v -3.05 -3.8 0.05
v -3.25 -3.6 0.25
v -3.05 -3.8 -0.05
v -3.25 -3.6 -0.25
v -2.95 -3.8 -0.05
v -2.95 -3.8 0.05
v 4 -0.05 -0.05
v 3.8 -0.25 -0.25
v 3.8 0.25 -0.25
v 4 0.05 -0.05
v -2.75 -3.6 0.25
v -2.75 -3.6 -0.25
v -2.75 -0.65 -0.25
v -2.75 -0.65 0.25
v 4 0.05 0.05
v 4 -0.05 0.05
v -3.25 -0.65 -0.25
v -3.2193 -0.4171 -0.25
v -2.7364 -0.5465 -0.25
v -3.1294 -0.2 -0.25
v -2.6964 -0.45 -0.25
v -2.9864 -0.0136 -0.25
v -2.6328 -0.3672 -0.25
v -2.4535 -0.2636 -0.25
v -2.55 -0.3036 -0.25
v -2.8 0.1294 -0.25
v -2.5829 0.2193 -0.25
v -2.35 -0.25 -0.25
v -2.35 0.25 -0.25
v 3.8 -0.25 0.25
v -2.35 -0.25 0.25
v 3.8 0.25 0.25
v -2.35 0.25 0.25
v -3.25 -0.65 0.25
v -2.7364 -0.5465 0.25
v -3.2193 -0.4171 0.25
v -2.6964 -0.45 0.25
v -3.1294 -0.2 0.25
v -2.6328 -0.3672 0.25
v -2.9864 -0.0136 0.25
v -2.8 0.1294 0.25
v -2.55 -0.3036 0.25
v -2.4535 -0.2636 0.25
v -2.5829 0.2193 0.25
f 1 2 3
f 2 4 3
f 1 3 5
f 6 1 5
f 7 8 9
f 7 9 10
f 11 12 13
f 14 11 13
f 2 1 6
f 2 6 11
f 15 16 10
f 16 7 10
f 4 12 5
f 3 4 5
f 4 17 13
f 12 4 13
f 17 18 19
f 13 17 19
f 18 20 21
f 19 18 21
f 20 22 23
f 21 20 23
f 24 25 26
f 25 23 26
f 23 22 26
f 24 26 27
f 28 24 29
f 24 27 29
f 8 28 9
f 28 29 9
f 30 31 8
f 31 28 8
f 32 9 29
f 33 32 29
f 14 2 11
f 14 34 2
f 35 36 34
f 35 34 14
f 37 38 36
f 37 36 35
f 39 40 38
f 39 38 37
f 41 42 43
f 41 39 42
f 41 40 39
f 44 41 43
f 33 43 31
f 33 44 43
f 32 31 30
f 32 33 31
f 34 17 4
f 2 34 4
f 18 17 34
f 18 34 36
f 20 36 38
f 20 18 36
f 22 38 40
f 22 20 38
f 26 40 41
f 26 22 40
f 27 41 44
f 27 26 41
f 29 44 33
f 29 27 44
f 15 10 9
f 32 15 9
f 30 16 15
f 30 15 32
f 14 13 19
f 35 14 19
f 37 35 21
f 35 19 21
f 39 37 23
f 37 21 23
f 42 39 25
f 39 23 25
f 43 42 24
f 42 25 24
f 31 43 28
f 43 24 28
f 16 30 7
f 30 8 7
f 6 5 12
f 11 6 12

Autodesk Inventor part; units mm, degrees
sketch "Sketch_2" plane through (0, 0, 0) normal (0, 0, 1) x (1, 0, 0)
  line L0 (-0.5, -0.25) -> (3.8, -0.25)
  line L1 (3.8, -0.25) -> (4, -0.05)
  line L2 (4, -0.05) -> (4, 0.05)
  line L3 (4, 0.05) -> (3.8, 0.25)
  line L4 (3.8, 0.25) -> (-0.5, 0.25)
  line L5 (-0.5, 0.25) -> (-0.5, -0.25)
extrude "Extrusion1" add sketch "Sketch_2" along normal mid plane 0.5
sketch "Sketch_3" plane through (0, 0, 0) normal (0, 0, 1) x (1, 0, 0)
  line L0 (-3.25, -3.6) -> (-3.05, -3.8)
  line L1 (-3.05, -3.8) -> (-2.95, -3.8)
  line L2 (-2.95, -3.8) -> (-2.75, -3.6)
  line L3 (-2.75, -3.6) -> (-2.75, -0.65)
  arc A0 (-2.35, -0.25) -> (-2.75, -0.65) centre (-2.35, -0.65) ccw
  line L4 (-2.35, -0.25) -> (-0.5, -0.25)
  line L5 (-0.5, -0.25) -> (-0.5, 0.25)
  line L6 (-0.5, 0.25) -> (-2.35, 0.25)
  arc A1 (-2.35, 0.25) -> (-3.25, -0.65) centre (-2.35, -0.65) ccw
  line L7 (-3.25, -0.65) -> (-3.25, -3.6)
extrude "Extrusion2" add sketch "Sketch_3" along normal mid plane 0.5
sketch "Sketch_4" plane through (0, 0, 0) normal (0, 1, 0) x (-1, 0, 0)
  line L0 (-3.7, -1.25) -> (-3.7, -0.25)
  line L1 (-3.7, -0.25) -> (-3.8, -0.25)
  line L2 (-3.8, -0.25) -> (-4, -0.05)
  line L3 (-4, -0.05) -> (-4, 0.05)
  line L4 (-4, 0.05) -> (-3.8, 0.25)
  line L5 (-3.8, 0.25) -> (-3.7, 0.25)
  line L6 (-3.7, 0.25) -> (-3.7, 1.25)
  line L7 (-3.7, 1.25) -> (-5, 1.25)
  line L8 (-5, 1.25) -> (-5, -1.25)
  line L9 (-5, -1.25) -> (-3.7, -1.25)
extrude "Extrusion3" cut sketch "Sketch_4" along normal mid plane 0.5
sketch "Sketch_5" plane through (0, 0, 0) normal (1, 0, 0) x (0, 1, 0)
  line L0 (-4, 0.45) -> (-4, -0.45)
  line L1 (-4, -0.45) -> (-3.5, -0.45)
  line L2 (-3.5, -0.45) -> (-3.5, -0.25)
  line L3 (-3.5, -0.25) -> (-3.6, -0.25)
  line L4 (-3.6, -0.25) -> (-3.8, -0.05)
  line L5 (-3.8, -0.05) -> (-3.8, 0.05)
  line L6 (-3.8, 0.05) -> (-3.6, 0.25)
  line L7 (-3.6, 0.25) -> (-3.5, 0.25)
  line L8 (-3.5, 0.25) -> (-3.5, 0.45)
  line L9 (-3.5, 0.45) -> (-4, 0.45)
extrude "Extrusion4" cut sketch "Sketch_5" against normal blind 3.5
ref_plane "IP_PIN_XY" through (0, 0, 0) normal (1, 0, 0) x (0, 0, -1)
ref_plane "IP_PIN_YZ" through (0, 0, 0) normal (0, 0, -1) x (0, 1, 0)
ref_plane "IP_PIN_ZX" through (0, 0, 0) normal (0, 1, 0) x (1, 0, 0)
properties part number "BF021-06-A-B-0400-0280-N-G_P"
